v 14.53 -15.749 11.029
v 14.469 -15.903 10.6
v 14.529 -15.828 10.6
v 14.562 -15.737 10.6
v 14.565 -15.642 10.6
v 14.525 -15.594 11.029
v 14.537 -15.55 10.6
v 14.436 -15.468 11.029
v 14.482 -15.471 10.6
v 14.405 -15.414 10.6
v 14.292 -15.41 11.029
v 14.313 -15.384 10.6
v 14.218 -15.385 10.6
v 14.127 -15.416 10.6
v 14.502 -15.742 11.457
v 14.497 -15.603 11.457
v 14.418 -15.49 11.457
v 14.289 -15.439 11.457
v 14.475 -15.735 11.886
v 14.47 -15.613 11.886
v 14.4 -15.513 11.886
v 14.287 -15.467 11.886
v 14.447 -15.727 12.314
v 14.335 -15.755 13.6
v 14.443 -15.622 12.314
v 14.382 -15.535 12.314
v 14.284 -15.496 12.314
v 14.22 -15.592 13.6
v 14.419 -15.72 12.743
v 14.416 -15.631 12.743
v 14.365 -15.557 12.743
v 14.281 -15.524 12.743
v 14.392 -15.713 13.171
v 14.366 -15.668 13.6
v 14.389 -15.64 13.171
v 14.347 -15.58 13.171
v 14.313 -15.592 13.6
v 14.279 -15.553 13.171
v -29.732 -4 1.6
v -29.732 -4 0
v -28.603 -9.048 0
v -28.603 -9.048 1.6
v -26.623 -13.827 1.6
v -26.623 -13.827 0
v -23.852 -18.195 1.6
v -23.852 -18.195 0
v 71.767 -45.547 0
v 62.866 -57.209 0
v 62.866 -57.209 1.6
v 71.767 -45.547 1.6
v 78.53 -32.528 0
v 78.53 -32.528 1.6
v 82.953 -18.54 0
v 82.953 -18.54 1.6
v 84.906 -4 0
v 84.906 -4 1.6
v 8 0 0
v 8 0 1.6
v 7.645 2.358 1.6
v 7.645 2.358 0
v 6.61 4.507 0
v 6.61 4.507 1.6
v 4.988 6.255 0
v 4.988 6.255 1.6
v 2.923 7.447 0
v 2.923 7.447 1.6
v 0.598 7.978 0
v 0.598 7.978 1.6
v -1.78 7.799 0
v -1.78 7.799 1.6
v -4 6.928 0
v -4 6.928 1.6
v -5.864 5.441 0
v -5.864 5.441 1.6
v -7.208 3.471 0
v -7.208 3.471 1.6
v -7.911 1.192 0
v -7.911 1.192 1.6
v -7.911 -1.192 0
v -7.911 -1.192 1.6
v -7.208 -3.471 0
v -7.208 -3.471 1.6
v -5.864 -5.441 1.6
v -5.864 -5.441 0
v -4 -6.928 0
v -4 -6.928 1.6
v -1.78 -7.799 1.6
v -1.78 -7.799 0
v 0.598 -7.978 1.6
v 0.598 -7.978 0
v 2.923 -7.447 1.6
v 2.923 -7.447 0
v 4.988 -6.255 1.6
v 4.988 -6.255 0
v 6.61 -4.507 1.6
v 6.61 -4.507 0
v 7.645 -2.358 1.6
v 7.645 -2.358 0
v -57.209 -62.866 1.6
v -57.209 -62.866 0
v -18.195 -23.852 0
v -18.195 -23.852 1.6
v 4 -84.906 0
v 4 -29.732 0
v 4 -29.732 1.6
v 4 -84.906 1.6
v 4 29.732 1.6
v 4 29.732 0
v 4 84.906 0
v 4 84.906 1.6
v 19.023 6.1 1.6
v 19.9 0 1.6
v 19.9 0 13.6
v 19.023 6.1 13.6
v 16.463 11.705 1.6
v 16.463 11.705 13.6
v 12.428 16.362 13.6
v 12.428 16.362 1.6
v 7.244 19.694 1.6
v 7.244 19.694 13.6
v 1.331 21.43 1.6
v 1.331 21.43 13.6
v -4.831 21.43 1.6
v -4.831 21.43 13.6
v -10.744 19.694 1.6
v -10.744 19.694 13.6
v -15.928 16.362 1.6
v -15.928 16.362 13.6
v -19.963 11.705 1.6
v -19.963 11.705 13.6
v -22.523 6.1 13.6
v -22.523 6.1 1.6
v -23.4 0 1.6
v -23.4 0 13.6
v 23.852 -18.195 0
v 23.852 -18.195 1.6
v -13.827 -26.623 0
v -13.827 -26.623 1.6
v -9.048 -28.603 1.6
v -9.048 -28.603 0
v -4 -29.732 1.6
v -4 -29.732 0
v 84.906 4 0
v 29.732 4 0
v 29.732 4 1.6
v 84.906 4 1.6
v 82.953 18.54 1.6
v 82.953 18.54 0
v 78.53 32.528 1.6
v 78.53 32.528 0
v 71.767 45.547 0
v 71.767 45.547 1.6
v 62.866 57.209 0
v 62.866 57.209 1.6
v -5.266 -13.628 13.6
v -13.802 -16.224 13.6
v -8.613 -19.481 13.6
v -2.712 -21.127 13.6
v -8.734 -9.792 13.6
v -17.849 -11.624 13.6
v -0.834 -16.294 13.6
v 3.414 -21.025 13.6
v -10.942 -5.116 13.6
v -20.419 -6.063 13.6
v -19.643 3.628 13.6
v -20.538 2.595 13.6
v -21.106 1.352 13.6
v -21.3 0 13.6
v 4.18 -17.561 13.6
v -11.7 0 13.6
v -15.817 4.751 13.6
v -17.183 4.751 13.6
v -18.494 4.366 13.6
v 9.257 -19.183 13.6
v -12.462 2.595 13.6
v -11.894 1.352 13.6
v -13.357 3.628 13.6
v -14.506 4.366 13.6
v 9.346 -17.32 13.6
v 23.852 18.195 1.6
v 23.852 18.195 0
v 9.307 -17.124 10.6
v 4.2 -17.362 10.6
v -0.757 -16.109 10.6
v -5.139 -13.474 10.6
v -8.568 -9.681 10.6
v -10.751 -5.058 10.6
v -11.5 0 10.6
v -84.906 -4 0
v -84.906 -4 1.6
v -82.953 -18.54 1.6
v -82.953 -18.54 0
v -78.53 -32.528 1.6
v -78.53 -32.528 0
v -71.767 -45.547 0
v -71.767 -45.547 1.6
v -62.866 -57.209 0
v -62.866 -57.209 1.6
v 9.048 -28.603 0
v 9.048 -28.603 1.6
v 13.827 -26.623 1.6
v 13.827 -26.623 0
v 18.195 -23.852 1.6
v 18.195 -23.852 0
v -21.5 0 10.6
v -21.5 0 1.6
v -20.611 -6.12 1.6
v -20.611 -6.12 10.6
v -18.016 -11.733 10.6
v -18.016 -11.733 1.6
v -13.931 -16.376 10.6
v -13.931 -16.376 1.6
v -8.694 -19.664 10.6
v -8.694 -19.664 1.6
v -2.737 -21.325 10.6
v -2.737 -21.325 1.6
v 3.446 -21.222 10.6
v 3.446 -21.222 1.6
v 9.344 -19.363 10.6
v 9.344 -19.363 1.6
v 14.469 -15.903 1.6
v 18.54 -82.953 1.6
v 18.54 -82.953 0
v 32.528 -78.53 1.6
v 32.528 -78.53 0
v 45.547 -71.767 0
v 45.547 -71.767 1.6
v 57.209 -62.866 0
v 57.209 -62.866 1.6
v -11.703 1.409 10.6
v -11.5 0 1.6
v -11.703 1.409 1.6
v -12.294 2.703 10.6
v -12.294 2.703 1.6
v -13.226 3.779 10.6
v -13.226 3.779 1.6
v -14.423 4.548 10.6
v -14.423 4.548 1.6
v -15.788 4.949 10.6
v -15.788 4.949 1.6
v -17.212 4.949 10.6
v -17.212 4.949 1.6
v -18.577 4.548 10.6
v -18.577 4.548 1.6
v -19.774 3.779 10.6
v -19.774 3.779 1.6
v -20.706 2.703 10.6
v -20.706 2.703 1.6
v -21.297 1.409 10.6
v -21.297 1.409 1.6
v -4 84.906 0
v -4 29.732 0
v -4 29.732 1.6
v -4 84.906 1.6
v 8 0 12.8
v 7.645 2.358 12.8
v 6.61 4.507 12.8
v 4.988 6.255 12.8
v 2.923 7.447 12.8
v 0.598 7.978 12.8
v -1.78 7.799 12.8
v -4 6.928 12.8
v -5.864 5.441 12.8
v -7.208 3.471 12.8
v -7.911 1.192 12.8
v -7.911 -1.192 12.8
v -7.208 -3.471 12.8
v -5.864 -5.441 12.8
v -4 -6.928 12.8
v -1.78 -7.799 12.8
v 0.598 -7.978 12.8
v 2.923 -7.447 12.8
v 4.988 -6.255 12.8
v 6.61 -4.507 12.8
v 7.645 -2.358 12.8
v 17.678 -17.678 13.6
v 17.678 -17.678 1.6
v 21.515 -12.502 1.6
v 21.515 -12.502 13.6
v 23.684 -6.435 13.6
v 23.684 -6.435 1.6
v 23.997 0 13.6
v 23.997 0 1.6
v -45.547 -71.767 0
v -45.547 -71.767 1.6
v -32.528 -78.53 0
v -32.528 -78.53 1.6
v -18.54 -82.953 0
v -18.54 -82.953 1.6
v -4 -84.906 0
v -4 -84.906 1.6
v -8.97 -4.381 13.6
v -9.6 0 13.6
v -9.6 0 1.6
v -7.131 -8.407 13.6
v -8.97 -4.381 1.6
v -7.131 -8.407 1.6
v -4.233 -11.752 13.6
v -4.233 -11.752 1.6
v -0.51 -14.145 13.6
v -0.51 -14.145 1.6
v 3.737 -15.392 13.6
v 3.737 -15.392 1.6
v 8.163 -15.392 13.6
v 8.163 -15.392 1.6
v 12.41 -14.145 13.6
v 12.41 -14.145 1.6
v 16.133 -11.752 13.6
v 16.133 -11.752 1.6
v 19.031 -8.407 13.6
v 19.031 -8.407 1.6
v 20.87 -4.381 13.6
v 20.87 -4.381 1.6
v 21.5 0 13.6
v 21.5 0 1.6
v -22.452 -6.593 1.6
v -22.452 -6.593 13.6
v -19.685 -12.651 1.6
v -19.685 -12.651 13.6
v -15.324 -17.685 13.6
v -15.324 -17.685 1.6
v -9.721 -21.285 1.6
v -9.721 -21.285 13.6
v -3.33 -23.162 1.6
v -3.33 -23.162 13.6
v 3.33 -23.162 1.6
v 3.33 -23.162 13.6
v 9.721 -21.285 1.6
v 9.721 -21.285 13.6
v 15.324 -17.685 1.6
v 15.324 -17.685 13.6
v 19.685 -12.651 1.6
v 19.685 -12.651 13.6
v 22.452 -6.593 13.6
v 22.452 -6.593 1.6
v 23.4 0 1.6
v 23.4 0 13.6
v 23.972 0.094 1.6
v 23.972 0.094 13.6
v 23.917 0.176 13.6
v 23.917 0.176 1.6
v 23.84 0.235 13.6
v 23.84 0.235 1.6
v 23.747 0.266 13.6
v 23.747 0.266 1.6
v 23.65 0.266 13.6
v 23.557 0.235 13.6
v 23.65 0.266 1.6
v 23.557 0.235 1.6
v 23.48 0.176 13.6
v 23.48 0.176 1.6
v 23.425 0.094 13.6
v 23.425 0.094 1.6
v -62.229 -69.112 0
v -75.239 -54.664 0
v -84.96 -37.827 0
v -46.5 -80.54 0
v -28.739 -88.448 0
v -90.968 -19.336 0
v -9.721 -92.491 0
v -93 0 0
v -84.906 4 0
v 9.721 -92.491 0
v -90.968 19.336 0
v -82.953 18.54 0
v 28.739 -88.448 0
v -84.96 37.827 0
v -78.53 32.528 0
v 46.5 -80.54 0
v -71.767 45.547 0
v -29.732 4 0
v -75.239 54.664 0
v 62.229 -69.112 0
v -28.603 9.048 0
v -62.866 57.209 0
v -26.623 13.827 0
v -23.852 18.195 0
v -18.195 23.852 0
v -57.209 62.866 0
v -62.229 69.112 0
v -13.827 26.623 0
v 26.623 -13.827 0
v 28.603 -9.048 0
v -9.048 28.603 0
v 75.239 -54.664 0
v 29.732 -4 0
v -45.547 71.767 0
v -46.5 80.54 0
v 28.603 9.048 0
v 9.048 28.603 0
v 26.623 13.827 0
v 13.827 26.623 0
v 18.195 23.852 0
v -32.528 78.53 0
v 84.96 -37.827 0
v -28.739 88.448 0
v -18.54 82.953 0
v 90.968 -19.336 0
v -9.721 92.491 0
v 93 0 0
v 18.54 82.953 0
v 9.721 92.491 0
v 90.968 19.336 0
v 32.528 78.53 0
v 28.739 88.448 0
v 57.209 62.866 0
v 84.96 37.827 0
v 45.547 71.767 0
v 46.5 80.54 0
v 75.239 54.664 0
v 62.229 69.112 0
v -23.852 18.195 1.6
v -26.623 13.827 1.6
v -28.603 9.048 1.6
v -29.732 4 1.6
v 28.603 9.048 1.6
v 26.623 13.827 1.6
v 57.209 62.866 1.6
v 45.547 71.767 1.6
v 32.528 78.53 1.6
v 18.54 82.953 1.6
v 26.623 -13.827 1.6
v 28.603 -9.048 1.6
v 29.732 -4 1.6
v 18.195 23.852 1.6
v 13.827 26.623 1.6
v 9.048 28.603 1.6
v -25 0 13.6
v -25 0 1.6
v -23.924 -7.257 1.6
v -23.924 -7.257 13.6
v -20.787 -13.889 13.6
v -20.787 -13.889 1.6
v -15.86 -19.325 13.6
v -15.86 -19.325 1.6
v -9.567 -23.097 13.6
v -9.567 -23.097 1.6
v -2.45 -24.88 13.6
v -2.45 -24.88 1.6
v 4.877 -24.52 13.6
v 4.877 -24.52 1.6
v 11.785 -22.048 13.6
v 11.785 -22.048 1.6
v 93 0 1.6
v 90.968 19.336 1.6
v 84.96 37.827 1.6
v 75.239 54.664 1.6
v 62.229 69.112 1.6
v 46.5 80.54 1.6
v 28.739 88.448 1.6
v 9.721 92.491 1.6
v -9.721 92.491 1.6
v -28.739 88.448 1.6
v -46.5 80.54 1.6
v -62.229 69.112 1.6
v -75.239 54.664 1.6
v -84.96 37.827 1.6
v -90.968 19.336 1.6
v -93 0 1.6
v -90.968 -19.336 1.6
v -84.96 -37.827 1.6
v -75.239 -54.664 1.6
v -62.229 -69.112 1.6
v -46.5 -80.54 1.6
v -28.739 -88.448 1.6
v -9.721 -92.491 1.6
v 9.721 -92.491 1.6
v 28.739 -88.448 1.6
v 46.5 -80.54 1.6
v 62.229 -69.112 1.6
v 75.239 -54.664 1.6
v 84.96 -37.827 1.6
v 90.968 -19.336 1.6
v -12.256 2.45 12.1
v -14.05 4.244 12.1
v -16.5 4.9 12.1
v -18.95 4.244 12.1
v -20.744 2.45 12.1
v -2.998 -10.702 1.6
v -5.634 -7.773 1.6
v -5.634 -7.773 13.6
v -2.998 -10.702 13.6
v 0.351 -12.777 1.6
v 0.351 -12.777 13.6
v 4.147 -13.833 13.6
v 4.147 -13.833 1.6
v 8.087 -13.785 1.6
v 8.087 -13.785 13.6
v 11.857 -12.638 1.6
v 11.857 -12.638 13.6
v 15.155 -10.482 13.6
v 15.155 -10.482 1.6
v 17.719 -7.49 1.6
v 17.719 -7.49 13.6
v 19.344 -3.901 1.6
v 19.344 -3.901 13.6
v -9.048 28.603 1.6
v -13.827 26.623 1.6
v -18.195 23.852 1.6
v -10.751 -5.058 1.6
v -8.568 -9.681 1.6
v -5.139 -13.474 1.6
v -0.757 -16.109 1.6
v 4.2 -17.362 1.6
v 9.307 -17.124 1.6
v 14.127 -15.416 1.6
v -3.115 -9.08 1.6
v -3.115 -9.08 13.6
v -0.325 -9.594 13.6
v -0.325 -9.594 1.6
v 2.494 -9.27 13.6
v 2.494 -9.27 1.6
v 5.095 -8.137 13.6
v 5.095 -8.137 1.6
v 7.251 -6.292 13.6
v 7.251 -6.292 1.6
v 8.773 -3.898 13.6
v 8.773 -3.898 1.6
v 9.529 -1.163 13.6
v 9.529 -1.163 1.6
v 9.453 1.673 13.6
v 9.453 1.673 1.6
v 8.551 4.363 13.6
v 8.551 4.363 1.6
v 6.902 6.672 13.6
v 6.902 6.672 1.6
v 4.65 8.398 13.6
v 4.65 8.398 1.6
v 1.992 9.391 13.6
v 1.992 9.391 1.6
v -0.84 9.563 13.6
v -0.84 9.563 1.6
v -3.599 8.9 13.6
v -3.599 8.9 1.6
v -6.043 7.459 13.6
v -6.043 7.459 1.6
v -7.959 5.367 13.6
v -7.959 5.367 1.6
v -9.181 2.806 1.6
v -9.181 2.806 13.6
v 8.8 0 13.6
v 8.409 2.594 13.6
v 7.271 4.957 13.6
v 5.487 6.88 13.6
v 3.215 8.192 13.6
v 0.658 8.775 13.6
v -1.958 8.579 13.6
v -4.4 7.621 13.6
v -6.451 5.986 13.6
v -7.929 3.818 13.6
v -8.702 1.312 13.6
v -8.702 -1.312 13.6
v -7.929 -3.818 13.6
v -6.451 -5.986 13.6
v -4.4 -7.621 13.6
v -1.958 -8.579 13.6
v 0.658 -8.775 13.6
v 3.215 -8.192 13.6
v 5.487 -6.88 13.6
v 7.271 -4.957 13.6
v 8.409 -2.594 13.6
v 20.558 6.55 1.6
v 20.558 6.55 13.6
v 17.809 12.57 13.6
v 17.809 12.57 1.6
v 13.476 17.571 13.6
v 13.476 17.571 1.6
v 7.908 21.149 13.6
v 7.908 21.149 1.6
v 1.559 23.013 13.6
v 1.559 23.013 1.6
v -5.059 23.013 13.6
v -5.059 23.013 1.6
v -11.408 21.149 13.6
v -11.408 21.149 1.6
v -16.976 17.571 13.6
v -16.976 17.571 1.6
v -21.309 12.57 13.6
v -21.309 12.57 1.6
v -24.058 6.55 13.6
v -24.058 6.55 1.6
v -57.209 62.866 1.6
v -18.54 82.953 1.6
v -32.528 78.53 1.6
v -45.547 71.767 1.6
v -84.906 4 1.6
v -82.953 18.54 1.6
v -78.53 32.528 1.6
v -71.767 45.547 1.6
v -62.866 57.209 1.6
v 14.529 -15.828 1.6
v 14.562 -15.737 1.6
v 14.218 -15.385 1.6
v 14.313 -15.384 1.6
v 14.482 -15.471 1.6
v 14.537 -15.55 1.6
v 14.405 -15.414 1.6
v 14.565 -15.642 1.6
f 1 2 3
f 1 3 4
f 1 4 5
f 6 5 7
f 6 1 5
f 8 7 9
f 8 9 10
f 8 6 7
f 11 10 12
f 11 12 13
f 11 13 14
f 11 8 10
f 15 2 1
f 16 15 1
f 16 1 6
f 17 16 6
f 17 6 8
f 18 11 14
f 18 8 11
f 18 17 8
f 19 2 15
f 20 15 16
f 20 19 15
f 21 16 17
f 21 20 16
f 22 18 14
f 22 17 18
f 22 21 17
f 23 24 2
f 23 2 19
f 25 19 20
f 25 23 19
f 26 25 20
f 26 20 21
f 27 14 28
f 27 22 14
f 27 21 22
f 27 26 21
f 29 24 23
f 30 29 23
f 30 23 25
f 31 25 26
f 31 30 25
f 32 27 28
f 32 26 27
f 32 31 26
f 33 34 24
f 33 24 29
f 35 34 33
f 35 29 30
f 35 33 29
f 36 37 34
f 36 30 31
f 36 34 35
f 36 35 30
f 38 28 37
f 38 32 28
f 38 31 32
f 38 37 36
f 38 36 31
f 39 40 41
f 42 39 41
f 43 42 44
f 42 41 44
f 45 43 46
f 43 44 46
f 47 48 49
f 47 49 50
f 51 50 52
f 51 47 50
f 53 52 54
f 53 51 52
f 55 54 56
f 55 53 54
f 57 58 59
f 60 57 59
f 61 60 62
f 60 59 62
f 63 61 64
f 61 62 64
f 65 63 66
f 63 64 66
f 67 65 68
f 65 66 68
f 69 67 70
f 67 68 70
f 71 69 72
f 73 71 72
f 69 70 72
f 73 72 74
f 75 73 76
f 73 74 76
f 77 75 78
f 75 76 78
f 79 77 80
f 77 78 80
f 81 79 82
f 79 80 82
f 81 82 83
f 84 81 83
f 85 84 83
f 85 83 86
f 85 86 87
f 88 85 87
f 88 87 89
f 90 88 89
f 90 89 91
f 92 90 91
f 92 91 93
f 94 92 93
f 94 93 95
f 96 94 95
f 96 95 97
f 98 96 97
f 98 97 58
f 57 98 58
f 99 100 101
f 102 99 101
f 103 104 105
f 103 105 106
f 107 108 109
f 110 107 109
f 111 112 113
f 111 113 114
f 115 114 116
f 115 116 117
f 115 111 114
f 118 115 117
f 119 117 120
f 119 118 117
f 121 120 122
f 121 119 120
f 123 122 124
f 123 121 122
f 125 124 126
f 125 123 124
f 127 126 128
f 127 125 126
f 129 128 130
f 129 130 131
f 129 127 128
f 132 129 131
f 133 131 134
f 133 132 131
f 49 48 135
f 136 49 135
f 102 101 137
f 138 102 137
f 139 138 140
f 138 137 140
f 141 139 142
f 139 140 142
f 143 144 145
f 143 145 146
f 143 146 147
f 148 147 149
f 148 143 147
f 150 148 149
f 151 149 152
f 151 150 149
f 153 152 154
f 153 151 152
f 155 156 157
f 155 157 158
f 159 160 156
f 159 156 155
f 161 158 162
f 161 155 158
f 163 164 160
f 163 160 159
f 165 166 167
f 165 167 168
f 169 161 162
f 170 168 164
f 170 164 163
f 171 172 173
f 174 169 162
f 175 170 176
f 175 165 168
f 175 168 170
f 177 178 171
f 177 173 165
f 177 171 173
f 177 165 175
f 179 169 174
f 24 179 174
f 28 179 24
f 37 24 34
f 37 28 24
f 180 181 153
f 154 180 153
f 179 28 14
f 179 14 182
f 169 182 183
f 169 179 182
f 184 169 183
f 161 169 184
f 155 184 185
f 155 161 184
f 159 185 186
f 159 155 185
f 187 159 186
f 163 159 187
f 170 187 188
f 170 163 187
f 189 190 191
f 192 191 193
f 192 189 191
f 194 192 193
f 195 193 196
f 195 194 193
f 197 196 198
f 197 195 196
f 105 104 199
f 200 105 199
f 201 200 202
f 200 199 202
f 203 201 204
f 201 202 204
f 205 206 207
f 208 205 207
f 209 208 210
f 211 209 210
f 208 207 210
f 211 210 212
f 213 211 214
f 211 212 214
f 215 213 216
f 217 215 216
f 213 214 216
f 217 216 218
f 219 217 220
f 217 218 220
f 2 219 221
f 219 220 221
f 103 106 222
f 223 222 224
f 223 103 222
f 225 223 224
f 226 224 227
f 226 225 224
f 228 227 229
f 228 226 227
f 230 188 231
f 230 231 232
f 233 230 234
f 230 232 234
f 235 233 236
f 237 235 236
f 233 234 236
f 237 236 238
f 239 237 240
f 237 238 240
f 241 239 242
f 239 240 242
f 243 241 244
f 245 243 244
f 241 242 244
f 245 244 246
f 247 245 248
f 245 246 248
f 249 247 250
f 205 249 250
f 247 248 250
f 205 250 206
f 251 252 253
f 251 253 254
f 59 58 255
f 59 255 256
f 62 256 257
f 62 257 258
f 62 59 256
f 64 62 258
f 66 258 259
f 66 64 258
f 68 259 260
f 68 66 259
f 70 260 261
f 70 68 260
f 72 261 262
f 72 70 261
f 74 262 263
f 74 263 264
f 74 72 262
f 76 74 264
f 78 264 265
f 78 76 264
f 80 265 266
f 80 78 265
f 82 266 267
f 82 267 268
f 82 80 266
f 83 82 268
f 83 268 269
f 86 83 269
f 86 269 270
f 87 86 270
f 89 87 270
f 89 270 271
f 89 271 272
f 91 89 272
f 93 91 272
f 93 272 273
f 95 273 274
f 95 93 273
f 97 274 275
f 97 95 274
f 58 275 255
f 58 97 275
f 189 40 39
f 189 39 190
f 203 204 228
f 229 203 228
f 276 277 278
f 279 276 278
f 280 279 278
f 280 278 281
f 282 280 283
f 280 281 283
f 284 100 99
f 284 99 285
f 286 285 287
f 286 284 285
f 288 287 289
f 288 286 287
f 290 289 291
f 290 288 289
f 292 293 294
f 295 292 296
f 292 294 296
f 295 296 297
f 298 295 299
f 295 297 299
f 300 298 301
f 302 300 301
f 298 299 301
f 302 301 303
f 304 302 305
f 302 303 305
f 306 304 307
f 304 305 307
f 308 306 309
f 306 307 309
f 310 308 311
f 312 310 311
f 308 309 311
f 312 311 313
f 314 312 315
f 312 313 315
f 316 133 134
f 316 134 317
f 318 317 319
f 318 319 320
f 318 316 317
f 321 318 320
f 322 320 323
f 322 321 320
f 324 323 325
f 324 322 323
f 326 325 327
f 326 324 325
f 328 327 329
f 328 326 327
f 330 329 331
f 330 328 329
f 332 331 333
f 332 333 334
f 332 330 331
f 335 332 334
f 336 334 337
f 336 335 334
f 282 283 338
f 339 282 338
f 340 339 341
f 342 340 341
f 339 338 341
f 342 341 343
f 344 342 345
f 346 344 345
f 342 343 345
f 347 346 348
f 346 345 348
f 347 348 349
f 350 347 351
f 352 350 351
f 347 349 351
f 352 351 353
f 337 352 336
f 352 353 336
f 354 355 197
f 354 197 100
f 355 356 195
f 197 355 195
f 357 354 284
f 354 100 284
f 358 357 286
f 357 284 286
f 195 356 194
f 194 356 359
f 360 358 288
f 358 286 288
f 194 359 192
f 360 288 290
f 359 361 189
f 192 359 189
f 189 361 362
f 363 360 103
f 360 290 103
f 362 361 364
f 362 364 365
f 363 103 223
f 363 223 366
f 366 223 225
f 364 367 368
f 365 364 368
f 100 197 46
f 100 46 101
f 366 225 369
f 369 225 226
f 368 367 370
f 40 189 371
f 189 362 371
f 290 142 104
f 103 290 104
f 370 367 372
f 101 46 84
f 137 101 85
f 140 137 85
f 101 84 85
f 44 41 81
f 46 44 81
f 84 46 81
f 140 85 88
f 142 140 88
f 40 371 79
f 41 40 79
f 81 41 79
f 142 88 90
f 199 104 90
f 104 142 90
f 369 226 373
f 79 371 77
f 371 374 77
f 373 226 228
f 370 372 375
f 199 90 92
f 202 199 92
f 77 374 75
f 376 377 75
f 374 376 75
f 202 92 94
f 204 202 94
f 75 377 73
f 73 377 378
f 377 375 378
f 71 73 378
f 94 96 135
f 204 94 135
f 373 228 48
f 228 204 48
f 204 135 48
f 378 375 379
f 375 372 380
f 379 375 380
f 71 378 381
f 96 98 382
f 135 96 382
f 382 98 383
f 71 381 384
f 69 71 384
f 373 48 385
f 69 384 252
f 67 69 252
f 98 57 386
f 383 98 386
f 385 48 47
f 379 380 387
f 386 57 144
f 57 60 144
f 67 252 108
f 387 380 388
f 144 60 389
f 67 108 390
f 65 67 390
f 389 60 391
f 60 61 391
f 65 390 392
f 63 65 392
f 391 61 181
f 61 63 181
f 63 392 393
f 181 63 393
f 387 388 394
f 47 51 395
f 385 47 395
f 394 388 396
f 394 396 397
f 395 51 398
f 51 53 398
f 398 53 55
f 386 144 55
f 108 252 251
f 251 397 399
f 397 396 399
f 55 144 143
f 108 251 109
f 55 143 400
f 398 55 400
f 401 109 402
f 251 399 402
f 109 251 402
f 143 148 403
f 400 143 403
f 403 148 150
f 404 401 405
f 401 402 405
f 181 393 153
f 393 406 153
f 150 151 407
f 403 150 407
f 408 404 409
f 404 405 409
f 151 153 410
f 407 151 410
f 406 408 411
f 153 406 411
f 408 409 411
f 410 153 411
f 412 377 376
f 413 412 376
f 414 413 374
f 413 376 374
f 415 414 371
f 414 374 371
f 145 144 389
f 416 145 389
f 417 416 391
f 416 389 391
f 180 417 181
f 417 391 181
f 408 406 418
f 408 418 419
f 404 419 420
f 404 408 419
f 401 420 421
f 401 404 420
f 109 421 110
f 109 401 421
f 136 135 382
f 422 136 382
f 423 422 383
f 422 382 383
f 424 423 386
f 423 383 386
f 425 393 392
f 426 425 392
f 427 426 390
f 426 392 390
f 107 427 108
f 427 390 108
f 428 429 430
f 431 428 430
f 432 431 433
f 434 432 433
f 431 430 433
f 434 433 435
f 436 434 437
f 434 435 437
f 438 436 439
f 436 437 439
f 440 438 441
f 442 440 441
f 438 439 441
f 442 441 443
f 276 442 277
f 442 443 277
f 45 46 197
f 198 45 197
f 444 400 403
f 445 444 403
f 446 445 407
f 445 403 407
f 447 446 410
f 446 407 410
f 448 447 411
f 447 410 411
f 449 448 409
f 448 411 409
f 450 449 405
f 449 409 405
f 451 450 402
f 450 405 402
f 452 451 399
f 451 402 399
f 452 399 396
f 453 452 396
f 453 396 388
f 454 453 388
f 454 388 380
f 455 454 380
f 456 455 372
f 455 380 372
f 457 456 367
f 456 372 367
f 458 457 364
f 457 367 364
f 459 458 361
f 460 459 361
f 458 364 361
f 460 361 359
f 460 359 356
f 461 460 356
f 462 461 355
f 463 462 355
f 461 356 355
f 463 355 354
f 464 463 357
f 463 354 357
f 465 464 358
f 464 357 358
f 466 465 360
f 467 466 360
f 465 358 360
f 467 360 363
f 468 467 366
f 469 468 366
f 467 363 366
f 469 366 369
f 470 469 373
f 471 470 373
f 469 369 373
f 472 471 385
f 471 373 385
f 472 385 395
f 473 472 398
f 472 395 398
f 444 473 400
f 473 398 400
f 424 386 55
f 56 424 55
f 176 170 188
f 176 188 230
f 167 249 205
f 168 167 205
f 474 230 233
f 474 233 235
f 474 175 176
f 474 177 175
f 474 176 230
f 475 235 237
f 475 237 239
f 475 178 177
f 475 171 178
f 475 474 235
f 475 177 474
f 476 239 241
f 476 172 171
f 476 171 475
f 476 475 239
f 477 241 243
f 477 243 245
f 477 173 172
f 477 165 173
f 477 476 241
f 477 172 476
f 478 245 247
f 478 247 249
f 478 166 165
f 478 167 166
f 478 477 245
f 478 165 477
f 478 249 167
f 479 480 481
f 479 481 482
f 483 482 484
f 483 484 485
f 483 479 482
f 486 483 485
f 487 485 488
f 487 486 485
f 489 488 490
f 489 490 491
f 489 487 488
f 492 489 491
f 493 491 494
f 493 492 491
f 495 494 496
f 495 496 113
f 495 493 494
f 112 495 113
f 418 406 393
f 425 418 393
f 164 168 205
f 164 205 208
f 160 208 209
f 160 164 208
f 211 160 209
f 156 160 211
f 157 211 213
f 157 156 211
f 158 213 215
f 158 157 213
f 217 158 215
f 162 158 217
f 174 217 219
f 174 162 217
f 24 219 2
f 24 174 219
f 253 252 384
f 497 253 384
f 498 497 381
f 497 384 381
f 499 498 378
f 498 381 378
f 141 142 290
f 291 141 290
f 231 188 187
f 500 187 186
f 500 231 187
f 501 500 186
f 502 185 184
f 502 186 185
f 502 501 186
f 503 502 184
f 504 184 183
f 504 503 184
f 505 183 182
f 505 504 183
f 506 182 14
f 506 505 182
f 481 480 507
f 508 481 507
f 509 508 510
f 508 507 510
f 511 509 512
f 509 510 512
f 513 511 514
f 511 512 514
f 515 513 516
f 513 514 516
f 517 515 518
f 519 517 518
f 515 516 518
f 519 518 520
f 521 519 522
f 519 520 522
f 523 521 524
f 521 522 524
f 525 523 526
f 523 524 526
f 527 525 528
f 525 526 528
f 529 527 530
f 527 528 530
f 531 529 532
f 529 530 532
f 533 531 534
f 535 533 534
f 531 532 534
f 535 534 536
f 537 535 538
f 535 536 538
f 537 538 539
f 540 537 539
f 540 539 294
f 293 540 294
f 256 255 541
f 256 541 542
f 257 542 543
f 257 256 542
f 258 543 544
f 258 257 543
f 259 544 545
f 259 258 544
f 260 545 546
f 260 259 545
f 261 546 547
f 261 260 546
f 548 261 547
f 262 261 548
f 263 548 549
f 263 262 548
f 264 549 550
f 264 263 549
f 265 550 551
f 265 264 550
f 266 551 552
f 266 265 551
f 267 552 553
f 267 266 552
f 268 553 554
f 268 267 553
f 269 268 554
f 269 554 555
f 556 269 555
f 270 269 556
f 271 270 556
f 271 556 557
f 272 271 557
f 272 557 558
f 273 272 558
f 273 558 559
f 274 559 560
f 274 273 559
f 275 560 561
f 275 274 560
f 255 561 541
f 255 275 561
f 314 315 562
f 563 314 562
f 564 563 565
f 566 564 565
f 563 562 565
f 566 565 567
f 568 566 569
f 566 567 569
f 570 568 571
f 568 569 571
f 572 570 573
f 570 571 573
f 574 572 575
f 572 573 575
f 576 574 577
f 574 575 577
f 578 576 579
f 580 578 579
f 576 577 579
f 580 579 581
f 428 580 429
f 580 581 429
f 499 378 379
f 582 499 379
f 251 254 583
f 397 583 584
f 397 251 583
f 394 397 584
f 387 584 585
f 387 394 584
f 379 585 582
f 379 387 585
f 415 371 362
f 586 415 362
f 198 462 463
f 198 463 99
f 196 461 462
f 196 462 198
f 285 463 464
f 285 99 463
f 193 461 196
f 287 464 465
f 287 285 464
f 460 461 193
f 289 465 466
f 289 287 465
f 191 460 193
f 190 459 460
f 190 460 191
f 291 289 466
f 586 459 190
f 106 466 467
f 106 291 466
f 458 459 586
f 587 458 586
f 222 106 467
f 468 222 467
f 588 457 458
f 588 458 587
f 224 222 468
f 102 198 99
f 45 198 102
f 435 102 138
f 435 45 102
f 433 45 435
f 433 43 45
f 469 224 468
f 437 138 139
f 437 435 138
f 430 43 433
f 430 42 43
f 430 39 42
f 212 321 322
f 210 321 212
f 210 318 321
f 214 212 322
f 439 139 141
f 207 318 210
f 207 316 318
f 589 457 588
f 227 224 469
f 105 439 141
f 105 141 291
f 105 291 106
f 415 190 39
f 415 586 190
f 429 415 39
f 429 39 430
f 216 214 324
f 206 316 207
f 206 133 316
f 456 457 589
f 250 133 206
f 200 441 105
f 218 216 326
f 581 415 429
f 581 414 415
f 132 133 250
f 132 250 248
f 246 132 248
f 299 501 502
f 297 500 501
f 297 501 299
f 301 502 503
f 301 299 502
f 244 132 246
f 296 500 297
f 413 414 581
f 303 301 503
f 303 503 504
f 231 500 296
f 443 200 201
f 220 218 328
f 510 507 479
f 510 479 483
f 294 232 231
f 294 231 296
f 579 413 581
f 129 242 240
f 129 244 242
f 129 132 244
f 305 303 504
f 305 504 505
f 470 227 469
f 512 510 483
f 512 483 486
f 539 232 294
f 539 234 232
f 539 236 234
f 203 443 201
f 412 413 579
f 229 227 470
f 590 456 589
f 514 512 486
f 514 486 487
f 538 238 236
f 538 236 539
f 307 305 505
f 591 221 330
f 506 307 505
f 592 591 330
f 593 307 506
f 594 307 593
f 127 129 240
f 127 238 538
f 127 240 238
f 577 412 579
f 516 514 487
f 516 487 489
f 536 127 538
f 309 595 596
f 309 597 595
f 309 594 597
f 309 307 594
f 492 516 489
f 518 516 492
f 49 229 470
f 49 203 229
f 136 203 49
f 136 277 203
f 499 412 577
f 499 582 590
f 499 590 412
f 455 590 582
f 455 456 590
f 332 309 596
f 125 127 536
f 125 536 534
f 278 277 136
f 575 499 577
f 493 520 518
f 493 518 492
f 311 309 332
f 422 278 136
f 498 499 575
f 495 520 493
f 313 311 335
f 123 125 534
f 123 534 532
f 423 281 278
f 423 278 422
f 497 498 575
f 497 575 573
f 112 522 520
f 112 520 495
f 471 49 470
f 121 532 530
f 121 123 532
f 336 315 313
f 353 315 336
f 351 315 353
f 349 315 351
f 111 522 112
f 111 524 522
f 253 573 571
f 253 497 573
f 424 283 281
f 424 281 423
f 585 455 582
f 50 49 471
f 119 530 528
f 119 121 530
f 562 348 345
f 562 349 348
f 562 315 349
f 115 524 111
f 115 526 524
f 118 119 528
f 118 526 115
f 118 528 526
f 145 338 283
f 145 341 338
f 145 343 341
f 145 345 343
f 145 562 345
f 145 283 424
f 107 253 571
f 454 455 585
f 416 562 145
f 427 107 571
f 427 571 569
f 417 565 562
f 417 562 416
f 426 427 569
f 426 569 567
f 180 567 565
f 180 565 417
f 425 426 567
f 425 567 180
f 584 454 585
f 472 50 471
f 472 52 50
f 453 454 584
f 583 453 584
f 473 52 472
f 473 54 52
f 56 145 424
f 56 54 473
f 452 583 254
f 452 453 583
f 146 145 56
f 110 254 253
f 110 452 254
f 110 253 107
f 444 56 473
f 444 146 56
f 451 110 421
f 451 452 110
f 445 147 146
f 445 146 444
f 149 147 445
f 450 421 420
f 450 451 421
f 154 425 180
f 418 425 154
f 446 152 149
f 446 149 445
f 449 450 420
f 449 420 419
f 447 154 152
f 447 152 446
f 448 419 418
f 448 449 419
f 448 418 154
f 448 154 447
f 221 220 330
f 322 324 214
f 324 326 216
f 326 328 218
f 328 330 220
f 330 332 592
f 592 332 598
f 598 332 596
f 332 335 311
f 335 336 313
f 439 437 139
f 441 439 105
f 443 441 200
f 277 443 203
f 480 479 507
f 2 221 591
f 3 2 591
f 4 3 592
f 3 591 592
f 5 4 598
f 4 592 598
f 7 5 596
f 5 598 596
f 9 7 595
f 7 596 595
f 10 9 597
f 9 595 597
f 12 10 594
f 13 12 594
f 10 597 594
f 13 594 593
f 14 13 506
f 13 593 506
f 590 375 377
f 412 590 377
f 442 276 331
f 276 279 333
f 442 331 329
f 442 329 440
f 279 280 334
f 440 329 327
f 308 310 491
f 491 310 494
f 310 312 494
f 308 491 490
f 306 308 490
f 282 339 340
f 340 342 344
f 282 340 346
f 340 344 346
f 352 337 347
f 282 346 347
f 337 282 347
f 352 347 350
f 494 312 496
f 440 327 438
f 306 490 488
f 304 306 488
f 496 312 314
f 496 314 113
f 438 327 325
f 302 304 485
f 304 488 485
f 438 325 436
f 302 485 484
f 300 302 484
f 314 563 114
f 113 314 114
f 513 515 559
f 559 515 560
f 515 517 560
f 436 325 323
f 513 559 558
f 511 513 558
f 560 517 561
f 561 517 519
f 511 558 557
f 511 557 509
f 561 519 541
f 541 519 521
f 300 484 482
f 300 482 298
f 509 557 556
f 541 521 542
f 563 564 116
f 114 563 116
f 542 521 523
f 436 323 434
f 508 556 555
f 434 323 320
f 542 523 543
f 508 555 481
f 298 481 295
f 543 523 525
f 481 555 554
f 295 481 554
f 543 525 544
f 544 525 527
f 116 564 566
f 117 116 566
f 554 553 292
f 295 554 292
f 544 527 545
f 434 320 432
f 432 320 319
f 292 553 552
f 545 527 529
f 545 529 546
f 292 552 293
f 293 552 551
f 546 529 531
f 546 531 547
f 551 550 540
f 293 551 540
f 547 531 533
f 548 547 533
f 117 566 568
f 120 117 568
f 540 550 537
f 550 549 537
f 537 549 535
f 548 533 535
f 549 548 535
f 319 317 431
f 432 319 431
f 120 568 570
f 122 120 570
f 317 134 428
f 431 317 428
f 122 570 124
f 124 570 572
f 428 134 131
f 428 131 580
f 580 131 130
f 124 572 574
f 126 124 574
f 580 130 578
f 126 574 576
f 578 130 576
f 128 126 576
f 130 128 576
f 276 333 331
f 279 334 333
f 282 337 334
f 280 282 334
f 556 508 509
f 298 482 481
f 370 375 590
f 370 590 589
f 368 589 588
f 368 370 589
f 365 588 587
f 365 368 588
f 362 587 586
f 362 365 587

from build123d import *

# Parameters (mm, degrees)
SKETCH012_R           = 93
PAD008_DEPTH          = 1.6
POCKET003_DEPTH       = 527.6981773351
POLARPATTERN001_COUNT = 4
SKETCH015_R           = 8
POCKET004_DEPTH       = 1.601
SKETCH013_R           = 8
PAD009_DEPTH          = 12
CHAMFER005_SIZE2      = 0.2
CHAMFER005_SIZE       = 3
CHAMFER006_SIZE       = 0.8


with BuildPart() as part:
    # Sketch012 → Pad008 (new body)
    with BuildSketch(Plane.XY):
        Circle(SKETCH012_R)
    extrude(amount=PAD008_DEPTH)

    # Sketch014 → Pocket003 (cut, through all)
    with BuildSketch(Plane.XY):
        with BuildLine():
            Line((-29.7321374946, 4), (-84.9058301885, 4))
            ThreePointArc((-62.8659154133, 57.2090611638), (-78.5297602635, 32.528091751), (-84.9058301885, 4))
            Line((-62.8659154133, 57.2090611638), (-23.8522231664, 18.1953689169))
            ThreePointArc((-23.8522231664, 18.1953689169), (-27.7163859753, 11.480502971), (-29.7321374946, 4))
        make_face()
        with BuildLine():
            Line((-18.1953689169, 23.8522231664), (-57.2090611638, 62.8659154133))
            ThreePointArc((-4, 84.9058301885), (-32.528091751, 78.5297602635), (-57.2090611638, 62.8659154133))
            Line((-4, 29.7321374946), (-4, 84.9058301885))
            ThreePointArc((-4, 29.7321374946), (-11.480502971, 27.7163859753), (-18.1953689169, 23.8522231664))
        make_face()
    pocket003 = extrude(amount=POCKET003_DEPTH, mode=Mode.SUBTRACT)

    # PolarPattern001: Pocket003 ×4 about axis
    polarpattern001_axis = Axis((0, 0, 0), (0, 0, 1))
    for i in range(1, POLARPATTERN001_COUNT):
        add(pocket003.rotate(polarpattern001_axis, i * 360 / POLARPATTERN001_COUNT), mode=Mode.SUBTRACT)

    # Sketch015 → Pocket004 (cut, through all)
    with BuildSketch(Plane.XY.offset(1.6)):
        Circle(SKETCH015_R)
    extrude(amount=-POCKET004_DEPTH, mode=Mode.SUBTRACT)

    # Sketch013 → Pad009 (join)
    with BuildSketch(Plane.XY.offset(1.6)):
        with BuildLine():
            ThreePointArc((-23.4, 0), (0, -23.4), (23.4, 0))
            ThreePointArc((23.9970767333, 0), (23.6985383667, 0.2704222444), (23.4, 0))
            ThreePointArc((17.6776695297, -17.6776695297), (22.8235419267, -9.5488497004), (23.9970767333, 0))
            ThreePointArc((-25, 0), (-9.5670858091, -23.0969883128), (17.6776695297, -17.6776695297))
            ThreePointArc((21.5, 0), (-1.75, 23.25), (-25, 0))
            ThreePointArc((-9.6, -2.3e-09), (5.9500000012, -15.5499999986), (21.5, 0))
            ThreePointArc((-5.6336134454, -7.7731846465), (8.5511019487, 4.3633307762), (-9.6, 0))
            ThreePointArc((-5.6336134454, -7.7731846465), (10.0127018373, -13.3452970661), (19.9, 0))
            ThreePointArc((19.9, 0), (-1.75, 21.65), (-23.4, 0))
        make_face()
        Circle(SKETCH013_R, mode=Mode.SUBTRACT)
        with BuildLine():
            ThreePointArc((-11.5, 0), (-16.5, 5), (-21.5, 0))
            ThreePointArc((-21.5, 0), (-8.6937875889, -19.6638769667), (14.4691216149, -15.90265763))
            ThreePointArc((14.4691216149, -15.90265763), (14.5126122143, -15.5081737413), (14.1266540458, -15.4157331507))
            ThreePointArc((-11.5, 0), (-3.0449954664, -14.9530116204), (14.1266540458, -15.4157331507))
        make_face()
    extrude(amount=PAD009_DEPTH)

    # Chamfer005
    chamfer005_edges = [part.edges().sort_by_distance(p)[0] for p in [
        (-8.693788, -19.663877, 13.6),
    ]]
    chamfer005_side = part.faces().sort_by_distance((-8.693788, -19.663877, 7.6))[0]
    chamfer(chamfer005_edges, length=CHAMFER005_SIZE, length2=CHAMFER005_SIZE2, reference=chamfer005_side)

    # Chamfer006
    chamfer006_edges = [part.edges().sort_by_distance(p)[0] for p in [
        (-8, 0, 13.6),
    ]]
    chamfer(chamfer006_edges, length=CHAMFER006_SIZE)


solid = part.part
